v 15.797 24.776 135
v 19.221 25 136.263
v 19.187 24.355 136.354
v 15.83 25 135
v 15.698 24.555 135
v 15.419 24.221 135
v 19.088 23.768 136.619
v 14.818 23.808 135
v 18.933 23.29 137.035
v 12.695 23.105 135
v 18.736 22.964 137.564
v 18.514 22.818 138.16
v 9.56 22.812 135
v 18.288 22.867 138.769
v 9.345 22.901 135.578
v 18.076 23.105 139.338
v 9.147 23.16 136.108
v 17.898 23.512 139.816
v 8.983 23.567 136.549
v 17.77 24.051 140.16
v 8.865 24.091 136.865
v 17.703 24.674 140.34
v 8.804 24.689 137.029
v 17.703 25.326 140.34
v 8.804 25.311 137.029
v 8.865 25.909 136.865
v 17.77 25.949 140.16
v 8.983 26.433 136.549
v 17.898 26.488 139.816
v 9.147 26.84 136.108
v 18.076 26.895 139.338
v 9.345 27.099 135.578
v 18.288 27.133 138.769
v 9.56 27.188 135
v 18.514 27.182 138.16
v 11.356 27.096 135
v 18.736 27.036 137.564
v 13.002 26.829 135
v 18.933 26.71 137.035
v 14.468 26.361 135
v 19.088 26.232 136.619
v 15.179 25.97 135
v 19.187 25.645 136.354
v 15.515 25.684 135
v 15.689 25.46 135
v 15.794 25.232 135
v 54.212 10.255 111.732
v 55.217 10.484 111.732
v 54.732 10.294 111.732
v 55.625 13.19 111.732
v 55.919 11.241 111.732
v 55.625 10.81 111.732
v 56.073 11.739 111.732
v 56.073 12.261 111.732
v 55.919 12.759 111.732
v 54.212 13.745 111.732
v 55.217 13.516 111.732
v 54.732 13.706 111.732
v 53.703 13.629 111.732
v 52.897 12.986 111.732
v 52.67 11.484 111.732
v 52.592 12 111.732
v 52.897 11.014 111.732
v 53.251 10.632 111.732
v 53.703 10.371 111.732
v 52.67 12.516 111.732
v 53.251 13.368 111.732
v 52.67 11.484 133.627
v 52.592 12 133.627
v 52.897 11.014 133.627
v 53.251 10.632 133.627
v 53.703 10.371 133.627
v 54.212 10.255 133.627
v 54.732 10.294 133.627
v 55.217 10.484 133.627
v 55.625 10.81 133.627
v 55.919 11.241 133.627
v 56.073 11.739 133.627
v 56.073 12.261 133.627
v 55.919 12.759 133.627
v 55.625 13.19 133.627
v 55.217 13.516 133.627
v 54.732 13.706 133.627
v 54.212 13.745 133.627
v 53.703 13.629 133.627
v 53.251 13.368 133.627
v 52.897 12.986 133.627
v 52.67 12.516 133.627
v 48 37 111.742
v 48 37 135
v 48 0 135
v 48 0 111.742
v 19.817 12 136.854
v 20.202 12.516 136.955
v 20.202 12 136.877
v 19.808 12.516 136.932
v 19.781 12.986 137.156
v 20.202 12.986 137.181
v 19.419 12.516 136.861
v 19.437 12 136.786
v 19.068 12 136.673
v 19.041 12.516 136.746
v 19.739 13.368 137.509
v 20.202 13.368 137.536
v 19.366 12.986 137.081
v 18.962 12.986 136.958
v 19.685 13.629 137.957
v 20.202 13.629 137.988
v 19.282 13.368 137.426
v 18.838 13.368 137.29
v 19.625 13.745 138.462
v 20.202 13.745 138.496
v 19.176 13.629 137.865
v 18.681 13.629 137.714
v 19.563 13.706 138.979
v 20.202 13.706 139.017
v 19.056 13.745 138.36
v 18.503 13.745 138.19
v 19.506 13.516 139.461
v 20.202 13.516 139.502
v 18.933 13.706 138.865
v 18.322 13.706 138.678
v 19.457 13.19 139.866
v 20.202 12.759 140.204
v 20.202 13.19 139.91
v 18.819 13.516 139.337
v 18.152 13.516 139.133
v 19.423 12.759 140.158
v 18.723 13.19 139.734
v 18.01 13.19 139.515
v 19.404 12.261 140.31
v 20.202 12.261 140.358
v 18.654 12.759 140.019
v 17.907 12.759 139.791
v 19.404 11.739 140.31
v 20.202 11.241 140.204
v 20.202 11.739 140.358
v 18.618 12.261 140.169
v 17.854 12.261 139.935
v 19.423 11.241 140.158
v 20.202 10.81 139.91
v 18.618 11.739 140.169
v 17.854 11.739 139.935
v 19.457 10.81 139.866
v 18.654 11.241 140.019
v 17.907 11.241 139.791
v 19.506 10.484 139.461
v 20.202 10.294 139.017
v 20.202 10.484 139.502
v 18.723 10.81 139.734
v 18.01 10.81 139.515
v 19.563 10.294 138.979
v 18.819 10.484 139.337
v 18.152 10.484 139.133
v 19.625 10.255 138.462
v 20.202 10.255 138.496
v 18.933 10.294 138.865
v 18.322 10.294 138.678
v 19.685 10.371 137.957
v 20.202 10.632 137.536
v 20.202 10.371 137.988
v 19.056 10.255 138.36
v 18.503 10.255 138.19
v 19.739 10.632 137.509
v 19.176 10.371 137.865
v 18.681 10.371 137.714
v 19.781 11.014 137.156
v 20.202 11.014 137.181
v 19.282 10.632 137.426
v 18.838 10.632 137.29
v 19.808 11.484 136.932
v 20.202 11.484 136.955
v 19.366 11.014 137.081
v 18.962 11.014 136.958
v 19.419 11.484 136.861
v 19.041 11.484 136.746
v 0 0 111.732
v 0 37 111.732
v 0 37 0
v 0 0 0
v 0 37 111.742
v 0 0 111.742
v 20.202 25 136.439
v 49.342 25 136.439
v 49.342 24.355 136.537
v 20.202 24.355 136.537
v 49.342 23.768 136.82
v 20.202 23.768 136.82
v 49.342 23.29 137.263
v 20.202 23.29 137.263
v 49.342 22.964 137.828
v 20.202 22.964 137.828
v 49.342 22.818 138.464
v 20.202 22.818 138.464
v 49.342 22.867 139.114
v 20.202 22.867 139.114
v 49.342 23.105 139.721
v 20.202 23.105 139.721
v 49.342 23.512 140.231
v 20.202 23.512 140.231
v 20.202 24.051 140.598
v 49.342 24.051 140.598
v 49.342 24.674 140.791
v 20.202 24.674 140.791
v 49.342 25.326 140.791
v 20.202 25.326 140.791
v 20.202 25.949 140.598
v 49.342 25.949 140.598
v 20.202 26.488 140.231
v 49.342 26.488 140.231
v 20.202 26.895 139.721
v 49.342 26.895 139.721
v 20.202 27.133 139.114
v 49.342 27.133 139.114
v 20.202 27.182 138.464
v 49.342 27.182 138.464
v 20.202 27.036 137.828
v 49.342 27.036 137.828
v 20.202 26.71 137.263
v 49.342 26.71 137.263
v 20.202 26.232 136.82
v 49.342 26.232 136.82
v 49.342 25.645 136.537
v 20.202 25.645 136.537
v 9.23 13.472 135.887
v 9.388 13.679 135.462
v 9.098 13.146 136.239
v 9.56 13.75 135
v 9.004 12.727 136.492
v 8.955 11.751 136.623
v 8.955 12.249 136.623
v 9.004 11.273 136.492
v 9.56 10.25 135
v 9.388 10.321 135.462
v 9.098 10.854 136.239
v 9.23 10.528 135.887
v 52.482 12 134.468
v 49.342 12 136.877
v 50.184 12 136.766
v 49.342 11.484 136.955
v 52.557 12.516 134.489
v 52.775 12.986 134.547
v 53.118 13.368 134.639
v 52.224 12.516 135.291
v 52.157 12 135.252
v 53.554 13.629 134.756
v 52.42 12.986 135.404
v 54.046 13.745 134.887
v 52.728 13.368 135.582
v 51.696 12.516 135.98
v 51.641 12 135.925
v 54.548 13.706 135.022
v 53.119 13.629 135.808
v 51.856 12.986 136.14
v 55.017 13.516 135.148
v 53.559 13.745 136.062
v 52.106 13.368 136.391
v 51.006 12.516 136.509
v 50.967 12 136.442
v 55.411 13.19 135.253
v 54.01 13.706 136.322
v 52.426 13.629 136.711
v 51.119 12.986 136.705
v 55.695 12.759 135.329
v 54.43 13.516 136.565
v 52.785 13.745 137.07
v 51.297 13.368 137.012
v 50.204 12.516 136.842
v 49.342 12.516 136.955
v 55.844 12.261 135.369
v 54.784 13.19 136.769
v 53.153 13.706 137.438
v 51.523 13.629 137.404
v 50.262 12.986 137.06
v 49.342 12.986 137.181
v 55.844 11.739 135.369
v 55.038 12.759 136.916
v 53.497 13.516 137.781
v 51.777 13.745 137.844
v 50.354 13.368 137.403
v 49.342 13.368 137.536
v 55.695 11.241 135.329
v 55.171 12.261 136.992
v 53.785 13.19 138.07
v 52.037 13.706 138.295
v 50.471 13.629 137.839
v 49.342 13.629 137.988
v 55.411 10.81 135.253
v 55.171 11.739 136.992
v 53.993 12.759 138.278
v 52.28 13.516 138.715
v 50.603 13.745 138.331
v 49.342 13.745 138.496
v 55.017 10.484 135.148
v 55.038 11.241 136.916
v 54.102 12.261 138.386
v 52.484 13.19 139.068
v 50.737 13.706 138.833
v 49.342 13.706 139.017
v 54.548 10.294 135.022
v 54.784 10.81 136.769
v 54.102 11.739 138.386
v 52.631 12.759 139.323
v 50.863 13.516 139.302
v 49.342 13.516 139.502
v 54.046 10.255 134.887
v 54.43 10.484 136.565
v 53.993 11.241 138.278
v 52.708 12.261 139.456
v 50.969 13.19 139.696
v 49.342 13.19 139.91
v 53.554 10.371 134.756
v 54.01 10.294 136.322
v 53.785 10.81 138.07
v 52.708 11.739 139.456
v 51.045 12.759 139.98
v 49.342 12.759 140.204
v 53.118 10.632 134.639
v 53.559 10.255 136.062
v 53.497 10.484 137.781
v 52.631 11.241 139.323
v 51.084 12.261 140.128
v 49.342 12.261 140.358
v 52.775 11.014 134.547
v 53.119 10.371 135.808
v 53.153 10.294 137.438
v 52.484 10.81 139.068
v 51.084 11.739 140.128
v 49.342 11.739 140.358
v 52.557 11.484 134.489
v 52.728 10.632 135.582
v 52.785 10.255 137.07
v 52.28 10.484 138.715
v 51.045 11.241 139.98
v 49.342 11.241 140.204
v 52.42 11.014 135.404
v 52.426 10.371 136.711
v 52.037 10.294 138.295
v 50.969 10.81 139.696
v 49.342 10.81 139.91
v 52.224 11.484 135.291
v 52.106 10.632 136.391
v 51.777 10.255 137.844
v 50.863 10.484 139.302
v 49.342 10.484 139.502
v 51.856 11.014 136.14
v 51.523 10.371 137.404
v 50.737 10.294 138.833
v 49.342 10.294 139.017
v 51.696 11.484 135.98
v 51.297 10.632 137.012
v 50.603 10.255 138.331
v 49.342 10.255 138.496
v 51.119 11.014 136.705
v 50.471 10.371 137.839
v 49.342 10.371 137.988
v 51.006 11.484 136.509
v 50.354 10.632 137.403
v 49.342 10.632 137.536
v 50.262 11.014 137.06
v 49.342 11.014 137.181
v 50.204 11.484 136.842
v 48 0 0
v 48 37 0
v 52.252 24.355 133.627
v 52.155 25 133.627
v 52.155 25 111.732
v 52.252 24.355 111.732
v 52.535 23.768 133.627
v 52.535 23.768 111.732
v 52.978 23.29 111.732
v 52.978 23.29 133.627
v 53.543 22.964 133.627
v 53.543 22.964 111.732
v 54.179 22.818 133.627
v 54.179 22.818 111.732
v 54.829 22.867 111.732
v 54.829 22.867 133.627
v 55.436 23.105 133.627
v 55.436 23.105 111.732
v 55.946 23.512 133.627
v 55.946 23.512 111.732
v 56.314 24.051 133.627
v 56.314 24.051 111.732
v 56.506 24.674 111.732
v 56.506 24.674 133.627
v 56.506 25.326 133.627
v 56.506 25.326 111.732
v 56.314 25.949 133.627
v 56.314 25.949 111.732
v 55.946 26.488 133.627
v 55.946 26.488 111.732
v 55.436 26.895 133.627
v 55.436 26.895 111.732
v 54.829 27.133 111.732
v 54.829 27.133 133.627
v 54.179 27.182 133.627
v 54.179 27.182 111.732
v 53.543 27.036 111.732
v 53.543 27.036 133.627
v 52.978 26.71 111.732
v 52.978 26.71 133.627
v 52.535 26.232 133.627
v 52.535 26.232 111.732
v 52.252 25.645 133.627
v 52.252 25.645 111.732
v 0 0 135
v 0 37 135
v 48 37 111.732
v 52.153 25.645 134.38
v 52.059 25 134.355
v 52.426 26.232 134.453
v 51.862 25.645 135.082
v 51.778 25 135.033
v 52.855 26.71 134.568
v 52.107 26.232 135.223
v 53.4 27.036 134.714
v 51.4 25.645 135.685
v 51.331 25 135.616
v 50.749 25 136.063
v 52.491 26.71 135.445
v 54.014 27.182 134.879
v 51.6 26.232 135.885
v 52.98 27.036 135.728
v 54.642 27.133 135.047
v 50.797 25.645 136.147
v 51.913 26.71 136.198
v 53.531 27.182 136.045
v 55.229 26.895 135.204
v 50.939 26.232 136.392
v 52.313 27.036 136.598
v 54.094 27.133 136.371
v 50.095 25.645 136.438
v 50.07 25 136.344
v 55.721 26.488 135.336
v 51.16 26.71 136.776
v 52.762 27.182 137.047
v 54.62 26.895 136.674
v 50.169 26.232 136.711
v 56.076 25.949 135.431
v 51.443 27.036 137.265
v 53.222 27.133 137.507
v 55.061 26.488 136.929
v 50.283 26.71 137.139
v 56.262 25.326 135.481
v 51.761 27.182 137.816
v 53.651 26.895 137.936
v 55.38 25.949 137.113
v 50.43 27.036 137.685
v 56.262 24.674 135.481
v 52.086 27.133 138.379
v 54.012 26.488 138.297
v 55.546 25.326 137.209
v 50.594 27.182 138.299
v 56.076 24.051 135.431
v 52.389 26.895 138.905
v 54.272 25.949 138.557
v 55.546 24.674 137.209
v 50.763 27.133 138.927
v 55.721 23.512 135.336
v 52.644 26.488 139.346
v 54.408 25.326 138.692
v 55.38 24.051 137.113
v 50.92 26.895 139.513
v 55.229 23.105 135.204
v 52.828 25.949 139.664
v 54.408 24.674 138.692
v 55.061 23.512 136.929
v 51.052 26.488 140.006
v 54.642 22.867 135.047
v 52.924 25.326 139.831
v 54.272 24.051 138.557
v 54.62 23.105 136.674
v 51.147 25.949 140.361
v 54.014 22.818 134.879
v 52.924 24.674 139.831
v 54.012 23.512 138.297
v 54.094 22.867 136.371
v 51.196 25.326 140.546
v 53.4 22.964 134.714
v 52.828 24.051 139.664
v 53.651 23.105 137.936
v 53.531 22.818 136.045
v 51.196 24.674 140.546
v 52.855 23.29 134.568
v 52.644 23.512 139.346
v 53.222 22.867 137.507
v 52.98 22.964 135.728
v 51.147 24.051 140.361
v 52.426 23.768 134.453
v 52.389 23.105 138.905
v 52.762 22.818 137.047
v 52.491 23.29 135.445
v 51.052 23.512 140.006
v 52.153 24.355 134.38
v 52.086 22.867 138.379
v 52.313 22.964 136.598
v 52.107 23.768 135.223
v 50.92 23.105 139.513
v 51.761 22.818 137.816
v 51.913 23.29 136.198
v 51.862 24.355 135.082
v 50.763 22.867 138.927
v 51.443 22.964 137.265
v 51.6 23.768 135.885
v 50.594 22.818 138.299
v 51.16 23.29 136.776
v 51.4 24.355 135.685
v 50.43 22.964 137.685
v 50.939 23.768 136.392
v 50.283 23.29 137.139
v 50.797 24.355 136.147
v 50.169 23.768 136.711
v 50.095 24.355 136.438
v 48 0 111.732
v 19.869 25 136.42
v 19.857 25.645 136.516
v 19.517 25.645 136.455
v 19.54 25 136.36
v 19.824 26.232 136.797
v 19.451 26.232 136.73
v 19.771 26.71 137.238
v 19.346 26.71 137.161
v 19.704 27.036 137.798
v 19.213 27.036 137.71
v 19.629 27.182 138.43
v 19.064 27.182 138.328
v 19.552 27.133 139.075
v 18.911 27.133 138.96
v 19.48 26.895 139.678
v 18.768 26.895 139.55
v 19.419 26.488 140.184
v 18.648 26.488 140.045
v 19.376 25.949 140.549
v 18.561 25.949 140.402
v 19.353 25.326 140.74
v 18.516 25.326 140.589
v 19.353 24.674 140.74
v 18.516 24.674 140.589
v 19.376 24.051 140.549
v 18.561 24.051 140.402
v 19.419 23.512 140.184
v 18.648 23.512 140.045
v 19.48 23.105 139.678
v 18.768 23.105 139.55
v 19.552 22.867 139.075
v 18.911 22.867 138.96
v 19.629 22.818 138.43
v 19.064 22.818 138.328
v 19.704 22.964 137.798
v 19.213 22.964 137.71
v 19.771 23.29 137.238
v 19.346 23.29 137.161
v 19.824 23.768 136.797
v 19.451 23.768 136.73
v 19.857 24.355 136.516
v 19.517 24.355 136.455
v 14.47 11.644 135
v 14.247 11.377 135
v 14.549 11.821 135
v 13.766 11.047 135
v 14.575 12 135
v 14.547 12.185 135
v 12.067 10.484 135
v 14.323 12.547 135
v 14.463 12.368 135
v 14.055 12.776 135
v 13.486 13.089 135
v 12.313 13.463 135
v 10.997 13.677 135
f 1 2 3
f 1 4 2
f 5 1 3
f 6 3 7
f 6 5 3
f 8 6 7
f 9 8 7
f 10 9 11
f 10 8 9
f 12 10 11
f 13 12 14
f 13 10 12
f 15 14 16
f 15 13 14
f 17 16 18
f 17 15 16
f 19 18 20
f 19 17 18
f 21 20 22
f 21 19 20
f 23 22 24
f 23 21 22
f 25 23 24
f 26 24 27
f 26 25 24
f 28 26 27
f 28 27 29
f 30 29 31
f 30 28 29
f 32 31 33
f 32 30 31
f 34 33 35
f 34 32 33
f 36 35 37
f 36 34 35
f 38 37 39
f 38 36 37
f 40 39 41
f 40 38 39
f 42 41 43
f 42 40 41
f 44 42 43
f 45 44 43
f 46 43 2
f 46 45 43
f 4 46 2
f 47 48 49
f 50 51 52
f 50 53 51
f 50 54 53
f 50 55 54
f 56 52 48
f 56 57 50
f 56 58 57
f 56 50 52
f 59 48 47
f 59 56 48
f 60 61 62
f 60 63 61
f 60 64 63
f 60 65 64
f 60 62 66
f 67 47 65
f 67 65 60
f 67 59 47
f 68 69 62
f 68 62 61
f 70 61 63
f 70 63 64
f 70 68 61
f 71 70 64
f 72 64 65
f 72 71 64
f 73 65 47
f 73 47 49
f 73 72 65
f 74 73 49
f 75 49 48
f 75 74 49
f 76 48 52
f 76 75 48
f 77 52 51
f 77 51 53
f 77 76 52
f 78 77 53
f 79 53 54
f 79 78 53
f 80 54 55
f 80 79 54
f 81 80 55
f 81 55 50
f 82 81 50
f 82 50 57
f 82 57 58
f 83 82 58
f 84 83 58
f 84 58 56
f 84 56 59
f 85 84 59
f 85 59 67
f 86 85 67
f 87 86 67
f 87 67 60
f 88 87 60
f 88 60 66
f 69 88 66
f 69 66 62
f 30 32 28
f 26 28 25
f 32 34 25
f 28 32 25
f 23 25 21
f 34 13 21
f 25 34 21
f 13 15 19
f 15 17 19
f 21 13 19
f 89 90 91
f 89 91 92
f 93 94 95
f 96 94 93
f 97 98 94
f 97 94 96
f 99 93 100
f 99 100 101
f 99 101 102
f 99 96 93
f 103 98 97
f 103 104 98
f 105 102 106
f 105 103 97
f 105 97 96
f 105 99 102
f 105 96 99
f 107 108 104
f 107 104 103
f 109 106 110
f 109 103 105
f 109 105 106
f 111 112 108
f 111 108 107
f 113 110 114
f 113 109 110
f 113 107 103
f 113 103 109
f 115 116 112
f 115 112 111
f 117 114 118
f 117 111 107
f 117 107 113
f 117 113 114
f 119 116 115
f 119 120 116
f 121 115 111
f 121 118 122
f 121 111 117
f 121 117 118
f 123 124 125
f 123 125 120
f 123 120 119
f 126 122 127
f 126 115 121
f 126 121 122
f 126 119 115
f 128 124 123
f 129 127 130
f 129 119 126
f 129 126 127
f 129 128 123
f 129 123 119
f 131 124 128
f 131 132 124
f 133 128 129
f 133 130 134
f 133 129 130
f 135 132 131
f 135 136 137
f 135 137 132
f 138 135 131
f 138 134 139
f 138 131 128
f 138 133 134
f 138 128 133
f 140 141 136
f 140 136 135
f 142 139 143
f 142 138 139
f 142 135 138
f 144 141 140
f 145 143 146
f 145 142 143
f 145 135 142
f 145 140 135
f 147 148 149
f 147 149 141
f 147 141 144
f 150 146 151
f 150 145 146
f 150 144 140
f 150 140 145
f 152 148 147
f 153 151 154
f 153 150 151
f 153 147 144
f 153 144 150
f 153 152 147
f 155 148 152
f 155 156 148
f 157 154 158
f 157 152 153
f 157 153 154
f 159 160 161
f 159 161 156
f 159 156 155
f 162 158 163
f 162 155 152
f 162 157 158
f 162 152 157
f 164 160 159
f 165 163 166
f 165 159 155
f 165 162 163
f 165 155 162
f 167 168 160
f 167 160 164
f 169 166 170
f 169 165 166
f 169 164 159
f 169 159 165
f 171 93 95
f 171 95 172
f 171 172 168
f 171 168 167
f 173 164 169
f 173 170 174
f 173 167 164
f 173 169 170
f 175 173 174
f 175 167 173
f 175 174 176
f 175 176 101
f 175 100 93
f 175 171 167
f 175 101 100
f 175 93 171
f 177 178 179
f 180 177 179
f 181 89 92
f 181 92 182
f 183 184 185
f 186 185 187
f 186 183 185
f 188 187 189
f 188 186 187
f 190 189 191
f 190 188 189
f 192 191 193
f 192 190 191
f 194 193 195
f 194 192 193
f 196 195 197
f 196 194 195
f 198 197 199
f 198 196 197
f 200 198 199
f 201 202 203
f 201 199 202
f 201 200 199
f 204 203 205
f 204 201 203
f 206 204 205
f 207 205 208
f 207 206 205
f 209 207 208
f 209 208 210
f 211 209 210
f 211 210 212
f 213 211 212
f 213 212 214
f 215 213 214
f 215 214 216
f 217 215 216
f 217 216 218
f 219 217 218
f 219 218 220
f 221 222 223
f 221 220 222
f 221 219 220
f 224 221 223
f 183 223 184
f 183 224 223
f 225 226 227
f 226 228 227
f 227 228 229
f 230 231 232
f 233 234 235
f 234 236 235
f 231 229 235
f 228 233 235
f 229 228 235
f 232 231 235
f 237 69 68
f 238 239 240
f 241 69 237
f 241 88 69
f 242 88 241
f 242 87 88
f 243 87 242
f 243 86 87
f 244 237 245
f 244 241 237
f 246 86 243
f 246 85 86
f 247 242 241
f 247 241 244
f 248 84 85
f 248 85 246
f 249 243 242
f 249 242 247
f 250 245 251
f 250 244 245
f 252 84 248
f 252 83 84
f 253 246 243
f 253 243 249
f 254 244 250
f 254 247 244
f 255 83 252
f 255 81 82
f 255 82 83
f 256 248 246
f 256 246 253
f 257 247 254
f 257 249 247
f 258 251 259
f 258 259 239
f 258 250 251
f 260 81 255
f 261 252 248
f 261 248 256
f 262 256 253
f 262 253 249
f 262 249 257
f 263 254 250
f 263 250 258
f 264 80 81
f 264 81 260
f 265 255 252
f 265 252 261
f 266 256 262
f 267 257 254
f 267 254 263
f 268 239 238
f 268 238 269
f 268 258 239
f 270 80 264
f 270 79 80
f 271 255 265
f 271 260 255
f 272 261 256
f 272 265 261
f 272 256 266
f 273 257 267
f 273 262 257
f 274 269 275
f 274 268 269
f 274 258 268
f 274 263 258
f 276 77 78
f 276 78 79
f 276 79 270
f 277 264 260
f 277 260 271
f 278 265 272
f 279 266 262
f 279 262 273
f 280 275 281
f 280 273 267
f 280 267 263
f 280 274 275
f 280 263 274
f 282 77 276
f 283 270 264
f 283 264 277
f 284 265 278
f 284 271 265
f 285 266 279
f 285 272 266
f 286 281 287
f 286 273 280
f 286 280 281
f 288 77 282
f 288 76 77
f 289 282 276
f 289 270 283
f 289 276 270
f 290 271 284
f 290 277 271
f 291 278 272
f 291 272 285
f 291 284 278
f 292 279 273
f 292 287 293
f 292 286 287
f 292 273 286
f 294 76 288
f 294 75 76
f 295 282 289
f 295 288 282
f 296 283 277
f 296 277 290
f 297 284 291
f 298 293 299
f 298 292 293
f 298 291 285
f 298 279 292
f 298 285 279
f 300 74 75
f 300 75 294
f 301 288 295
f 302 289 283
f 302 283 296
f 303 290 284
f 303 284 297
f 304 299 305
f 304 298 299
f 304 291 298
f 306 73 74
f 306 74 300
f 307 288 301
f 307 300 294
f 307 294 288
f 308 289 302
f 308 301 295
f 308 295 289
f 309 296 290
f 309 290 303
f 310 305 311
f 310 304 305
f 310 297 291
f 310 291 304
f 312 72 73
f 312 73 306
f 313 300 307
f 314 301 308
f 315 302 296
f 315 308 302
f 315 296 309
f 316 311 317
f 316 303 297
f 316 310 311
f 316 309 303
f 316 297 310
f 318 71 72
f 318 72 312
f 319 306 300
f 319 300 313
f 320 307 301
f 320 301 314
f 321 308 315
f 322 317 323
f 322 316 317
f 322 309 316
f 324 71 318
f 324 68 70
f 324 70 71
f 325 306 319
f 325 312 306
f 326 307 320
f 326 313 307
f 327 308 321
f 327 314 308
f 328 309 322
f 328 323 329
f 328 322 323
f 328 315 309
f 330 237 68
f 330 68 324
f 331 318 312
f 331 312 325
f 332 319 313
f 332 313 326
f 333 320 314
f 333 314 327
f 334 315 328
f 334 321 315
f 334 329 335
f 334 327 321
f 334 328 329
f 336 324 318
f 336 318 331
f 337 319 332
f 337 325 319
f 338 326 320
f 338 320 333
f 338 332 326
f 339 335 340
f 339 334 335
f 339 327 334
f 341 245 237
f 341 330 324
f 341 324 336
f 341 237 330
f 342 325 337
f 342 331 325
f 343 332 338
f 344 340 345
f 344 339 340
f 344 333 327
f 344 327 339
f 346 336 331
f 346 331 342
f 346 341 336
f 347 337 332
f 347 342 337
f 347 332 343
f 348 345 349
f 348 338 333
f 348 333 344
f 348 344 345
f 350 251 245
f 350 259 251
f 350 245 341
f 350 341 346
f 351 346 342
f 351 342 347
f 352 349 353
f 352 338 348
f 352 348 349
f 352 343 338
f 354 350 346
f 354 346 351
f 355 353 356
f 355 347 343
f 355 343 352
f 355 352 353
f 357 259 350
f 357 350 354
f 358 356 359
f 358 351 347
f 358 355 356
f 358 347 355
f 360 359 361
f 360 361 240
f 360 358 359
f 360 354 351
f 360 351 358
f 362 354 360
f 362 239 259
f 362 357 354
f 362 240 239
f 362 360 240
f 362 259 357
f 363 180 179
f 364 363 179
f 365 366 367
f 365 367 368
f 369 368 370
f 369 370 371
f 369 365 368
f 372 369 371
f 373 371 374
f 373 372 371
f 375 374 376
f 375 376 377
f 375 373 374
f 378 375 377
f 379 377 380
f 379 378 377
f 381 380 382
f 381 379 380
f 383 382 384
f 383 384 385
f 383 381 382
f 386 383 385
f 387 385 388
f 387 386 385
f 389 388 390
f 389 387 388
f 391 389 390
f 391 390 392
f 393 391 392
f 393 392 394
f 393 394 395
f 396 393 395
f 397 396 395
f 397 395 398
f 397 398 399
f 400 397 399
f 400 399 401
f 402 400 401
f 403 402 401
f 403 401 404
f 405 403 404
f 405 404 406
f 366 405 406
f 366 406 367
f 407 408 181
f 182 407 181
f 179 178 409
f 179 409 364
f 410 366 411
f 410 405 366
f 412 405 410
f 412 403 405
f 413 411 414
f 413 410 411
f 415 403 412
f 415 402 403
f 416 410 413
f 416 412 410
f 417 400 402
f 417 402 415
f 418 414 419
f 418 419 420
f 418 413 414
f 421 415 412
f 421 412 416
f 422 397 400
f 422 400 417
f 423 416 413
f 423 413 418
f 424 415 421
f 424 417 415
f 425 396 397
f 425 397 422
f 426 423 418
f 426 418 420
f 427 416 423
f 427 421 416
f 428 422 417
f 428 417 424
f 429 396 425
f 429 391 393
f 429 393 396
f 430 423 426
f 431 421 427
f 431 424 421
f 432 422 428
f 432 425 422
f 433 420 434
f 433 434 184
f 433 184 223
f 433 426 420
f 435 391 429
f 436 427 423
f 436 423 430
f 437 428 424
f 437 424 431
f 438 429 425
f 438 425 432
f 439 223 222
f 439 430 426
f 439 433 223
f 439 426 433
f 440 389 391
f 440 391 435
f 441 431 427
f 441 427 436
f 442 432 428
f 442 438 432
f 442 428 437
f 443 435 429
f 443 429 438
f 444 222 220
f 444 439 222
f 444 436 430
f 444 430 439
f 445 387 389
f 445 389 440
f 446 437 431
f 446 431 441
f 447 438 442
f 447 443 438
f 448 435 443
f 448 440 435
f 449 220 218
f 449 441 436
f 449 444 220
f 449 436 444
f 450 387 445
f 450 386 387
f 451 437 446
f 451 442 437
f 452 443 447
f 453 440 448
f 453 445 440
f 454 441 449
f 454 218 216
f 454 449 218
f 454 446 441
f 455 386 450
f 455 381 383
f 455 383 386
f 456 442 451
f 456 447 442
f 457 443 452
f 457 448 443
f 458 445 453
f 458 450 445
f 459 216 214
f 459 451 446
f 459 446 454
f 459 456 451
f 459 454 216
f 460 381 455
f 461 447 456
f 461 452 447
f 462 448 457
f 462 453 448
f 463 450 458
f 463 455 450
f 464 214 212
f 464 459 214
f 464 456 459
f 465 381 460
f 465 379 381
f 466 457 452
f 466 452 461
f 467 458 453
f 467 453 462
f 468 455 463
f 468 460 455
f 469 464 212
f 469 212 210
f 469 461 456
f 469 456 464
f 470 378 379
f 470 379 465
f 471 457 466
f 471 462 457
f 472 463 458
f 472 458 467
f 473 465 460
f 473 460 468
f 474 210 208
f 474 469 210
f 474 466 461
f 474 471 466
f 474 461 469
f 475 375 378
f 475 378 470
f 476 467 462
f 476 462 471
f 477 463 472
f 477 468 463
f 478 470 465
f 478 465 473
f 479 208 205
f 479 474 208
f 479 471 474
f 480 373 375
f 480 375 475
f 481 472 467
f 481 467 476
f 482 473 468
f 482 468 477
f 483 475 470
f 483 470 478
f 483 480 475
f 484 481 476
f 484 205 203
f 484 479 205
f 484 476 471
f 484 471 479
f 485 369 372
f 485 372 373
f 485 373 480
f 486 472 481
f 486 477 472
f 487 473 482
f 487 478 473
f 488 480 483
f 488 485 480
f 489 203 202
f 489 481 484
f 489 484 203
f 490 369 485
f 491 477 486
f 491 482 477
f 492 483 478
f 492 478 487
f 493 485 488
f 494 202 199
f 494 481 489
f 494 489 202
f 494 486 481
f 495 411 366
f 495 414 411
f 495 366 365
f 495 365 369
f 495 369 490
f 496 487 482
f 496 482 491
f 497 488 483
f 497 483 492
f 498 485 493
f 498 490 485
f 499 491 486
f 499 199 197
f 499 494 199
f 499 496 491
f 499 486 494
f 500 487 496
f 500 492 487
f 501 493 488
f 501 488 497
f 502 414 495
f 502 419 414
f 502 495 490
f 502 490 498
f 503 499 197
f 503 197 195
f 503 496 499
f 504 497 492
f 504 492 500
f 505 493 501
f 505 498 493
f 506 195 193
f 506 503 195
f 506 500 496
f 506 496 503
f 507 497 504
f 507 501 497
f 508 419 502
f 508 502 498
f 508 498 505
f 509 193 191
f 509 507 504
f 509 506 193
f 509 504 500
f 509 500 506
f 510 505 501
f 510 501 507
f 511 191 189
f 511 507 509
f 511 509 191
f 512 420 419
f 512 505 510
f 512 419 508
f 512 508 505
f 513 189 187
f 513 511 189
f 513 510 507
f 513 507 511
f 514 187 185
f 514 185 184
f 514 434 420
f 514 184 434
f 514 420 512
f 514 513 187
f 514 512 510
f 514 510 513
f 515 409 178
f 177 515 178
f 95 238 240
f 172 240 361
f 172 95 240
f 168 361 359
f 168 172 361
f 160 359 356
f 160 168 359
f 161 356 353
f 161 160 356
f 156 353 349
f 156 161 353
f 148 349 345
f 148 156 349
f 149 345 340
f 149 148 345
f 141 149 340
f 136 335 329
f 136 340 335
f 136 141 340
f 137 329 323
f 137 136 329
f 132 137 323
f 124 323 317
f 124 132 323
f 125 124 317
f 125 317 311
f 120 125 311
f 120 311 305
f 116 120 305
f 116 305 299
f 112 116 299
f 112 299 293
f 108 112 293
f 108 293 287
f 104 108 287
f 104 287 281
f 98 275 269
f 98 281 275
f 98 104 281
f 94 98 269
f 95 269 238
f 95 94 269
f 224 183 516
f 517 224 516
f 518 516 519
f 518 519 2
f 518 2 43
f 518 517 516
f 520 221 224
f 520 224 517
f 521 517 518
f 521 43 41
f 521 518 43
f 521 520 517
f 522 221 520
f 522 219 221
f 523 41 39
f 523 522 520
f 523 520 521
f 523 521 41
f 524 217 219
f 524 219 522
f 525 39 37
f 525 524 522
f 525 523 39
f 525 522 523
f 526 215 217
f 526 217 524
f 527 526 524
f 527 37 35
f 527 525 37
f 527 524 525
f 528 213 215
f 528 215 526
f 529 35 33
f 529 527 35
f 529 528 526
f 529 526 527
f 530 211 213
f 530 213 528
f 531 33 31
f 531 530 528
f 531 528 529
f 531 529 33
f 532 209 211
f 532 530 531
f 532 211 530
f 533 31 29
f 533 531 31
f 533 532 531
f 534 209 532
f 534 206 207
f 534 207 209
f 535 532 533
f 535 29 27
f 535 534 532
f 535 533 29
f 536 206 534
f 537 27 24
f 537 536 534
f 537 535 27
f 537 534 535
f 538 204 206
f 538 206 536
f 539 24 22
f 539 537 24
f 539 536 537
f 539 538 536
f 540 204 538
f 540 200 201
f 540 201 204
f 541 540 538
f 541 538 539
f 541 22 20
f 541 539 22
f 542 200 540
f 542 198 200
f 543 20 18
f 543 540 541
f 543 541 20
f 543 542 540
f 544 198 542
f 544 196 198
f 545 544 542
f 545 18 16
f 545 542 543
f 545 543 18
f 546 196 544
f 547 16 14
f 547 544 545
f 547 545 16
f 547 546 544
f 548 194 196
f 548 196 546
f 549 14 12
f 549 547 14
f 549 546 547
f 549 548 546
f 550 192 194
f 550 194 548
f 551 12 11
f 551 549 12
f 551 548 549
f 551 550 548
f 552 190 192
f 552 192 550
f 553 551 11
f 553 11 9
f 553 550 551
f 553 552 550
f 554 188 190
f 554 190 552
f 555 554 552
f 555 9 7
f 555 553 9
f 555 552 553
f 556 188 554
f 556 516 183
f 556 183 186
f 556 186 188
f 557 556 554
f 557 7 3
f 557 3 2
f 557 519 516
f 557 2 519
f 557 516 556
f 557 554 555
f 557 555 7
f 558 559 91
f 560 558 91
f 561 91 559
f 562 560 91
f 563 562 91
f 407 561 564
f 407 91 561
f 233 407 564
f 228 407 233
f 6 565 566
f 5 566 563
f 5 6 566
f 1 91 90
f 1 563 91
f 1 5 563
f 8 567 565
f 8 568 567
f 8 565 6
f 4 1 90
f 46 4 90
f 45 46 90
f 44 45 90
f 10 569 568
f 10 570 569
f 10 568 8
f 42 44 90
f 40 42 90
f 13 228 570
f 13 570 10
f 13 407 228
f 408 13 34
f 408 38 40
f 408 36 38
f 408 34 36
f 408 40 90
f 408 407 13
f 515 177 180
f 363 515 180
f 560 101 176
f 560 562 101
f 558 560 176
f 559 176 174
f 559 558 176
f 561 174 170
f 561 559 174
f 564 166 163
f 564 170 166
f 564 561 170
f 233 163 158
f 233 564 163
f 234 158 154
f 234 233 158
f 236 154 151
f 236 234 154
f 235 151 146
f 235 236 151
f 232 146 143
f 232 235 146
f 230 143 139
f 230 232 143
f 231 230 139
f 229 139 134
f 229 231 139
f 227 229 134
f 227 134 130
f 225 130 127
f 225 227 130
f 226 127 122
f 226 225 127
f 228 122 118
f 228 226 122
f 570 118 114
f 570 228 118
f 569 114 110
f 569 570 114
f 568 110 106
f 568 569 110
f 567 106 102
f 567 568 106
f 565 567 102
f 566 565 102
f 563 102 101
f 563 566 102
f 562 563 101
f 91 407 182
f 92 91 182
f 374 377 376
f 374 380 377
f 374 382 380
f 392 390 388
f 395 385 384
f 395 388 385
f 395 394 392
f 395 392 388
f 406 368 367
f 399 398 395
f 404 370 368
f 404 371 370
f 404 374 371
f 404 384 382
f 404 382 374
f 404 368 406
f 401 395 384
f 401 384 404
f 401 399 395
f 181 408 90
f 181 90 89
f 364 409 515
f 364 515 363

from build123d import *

# Parameters (mm, degrees)
ESQUISSE1_W             = 135
ESQUISSE1_H             = 37
BOSS_EXTRU_1_DEPTH      = 48
ESQUISSE3_R             = 1.75
ESQUISSE3_R_2           = 2.187725201
ESQUISSE4_W             = 48
ESQUISSE4_H             = 37
ENL_V_MAT_EXTRU_1_DEPTH = 0.01


with BuildPart() as part:
    # Esquisse1 → Boss.-Extru.1 (new body)
    with BuildSketch(Plane(origin=(0, 0, 0), x_dir=(0, 0, -1), z_dir=(1, 0, 0))):
        with Locations((-67.5, 18.5)):
            Rectangle(ESQUISSE1_W, ESQUISSE1_H)
    extrude(amount=BOSS_EXTRU_1_DEPTH)

    # Balayage1: sweep along a path in Esquisse2
    with BuildLine(Plane(origin=(0, 12, 0), x_dir=(-1, 0, 0), z_dir=(0, -1, 0))) as balayage1_path:
        Line((-54.342429432, -111.732100004), (-54.342429432, -133.627216376))
        ThreePointArc((-54.342429432, -133.627216376), (-52.877963338, -137.162750282), (-49.342429432, -138.627216376))
        Line((-49.342429432, -138.627216376), (-20.202133269, -138.627216376))
        ThreePointArc((-20.202133269, -138.627216376), (-19.315749698, -138.548021612), (-18.457444903, -138.312946043))
        Line((-18.457444903, -138.312946043), (-9.559827507, -135))
    # Esquisse3 → Balayage1 (sweep)
    with BuildSketch(Plane(origin=(0, 0, 111.732100004), x_dir=(-1, 0, 0), z_dir=(0, 0, -1))):
        with Locations((-54.342429432, 12)):
            Circle(ESQUISSE3_R)
        with Locations((-54.342429432, 25)):
            Circle(ESQUISSE3_R_2)
    sweep(path=balayage1_path.line)

    # Esquisse4 → Enlèv. mat.-Extru.1 (cut)
    with BuildSketch(Plane(origin=(0, 0, 111.732100004), x_dir=(-1, 0, 0), z_dir=(0, 0, -1))):
        with Locations((-24, 18.5)):
            Rectangle(ESQUISSE4_W, ESQUISSE4_H)
    extrude(amount=-ENL_V_MAT_EXTRU_1_DEPTH, mode=Mode.SUBTRACT)


solid = part.part
